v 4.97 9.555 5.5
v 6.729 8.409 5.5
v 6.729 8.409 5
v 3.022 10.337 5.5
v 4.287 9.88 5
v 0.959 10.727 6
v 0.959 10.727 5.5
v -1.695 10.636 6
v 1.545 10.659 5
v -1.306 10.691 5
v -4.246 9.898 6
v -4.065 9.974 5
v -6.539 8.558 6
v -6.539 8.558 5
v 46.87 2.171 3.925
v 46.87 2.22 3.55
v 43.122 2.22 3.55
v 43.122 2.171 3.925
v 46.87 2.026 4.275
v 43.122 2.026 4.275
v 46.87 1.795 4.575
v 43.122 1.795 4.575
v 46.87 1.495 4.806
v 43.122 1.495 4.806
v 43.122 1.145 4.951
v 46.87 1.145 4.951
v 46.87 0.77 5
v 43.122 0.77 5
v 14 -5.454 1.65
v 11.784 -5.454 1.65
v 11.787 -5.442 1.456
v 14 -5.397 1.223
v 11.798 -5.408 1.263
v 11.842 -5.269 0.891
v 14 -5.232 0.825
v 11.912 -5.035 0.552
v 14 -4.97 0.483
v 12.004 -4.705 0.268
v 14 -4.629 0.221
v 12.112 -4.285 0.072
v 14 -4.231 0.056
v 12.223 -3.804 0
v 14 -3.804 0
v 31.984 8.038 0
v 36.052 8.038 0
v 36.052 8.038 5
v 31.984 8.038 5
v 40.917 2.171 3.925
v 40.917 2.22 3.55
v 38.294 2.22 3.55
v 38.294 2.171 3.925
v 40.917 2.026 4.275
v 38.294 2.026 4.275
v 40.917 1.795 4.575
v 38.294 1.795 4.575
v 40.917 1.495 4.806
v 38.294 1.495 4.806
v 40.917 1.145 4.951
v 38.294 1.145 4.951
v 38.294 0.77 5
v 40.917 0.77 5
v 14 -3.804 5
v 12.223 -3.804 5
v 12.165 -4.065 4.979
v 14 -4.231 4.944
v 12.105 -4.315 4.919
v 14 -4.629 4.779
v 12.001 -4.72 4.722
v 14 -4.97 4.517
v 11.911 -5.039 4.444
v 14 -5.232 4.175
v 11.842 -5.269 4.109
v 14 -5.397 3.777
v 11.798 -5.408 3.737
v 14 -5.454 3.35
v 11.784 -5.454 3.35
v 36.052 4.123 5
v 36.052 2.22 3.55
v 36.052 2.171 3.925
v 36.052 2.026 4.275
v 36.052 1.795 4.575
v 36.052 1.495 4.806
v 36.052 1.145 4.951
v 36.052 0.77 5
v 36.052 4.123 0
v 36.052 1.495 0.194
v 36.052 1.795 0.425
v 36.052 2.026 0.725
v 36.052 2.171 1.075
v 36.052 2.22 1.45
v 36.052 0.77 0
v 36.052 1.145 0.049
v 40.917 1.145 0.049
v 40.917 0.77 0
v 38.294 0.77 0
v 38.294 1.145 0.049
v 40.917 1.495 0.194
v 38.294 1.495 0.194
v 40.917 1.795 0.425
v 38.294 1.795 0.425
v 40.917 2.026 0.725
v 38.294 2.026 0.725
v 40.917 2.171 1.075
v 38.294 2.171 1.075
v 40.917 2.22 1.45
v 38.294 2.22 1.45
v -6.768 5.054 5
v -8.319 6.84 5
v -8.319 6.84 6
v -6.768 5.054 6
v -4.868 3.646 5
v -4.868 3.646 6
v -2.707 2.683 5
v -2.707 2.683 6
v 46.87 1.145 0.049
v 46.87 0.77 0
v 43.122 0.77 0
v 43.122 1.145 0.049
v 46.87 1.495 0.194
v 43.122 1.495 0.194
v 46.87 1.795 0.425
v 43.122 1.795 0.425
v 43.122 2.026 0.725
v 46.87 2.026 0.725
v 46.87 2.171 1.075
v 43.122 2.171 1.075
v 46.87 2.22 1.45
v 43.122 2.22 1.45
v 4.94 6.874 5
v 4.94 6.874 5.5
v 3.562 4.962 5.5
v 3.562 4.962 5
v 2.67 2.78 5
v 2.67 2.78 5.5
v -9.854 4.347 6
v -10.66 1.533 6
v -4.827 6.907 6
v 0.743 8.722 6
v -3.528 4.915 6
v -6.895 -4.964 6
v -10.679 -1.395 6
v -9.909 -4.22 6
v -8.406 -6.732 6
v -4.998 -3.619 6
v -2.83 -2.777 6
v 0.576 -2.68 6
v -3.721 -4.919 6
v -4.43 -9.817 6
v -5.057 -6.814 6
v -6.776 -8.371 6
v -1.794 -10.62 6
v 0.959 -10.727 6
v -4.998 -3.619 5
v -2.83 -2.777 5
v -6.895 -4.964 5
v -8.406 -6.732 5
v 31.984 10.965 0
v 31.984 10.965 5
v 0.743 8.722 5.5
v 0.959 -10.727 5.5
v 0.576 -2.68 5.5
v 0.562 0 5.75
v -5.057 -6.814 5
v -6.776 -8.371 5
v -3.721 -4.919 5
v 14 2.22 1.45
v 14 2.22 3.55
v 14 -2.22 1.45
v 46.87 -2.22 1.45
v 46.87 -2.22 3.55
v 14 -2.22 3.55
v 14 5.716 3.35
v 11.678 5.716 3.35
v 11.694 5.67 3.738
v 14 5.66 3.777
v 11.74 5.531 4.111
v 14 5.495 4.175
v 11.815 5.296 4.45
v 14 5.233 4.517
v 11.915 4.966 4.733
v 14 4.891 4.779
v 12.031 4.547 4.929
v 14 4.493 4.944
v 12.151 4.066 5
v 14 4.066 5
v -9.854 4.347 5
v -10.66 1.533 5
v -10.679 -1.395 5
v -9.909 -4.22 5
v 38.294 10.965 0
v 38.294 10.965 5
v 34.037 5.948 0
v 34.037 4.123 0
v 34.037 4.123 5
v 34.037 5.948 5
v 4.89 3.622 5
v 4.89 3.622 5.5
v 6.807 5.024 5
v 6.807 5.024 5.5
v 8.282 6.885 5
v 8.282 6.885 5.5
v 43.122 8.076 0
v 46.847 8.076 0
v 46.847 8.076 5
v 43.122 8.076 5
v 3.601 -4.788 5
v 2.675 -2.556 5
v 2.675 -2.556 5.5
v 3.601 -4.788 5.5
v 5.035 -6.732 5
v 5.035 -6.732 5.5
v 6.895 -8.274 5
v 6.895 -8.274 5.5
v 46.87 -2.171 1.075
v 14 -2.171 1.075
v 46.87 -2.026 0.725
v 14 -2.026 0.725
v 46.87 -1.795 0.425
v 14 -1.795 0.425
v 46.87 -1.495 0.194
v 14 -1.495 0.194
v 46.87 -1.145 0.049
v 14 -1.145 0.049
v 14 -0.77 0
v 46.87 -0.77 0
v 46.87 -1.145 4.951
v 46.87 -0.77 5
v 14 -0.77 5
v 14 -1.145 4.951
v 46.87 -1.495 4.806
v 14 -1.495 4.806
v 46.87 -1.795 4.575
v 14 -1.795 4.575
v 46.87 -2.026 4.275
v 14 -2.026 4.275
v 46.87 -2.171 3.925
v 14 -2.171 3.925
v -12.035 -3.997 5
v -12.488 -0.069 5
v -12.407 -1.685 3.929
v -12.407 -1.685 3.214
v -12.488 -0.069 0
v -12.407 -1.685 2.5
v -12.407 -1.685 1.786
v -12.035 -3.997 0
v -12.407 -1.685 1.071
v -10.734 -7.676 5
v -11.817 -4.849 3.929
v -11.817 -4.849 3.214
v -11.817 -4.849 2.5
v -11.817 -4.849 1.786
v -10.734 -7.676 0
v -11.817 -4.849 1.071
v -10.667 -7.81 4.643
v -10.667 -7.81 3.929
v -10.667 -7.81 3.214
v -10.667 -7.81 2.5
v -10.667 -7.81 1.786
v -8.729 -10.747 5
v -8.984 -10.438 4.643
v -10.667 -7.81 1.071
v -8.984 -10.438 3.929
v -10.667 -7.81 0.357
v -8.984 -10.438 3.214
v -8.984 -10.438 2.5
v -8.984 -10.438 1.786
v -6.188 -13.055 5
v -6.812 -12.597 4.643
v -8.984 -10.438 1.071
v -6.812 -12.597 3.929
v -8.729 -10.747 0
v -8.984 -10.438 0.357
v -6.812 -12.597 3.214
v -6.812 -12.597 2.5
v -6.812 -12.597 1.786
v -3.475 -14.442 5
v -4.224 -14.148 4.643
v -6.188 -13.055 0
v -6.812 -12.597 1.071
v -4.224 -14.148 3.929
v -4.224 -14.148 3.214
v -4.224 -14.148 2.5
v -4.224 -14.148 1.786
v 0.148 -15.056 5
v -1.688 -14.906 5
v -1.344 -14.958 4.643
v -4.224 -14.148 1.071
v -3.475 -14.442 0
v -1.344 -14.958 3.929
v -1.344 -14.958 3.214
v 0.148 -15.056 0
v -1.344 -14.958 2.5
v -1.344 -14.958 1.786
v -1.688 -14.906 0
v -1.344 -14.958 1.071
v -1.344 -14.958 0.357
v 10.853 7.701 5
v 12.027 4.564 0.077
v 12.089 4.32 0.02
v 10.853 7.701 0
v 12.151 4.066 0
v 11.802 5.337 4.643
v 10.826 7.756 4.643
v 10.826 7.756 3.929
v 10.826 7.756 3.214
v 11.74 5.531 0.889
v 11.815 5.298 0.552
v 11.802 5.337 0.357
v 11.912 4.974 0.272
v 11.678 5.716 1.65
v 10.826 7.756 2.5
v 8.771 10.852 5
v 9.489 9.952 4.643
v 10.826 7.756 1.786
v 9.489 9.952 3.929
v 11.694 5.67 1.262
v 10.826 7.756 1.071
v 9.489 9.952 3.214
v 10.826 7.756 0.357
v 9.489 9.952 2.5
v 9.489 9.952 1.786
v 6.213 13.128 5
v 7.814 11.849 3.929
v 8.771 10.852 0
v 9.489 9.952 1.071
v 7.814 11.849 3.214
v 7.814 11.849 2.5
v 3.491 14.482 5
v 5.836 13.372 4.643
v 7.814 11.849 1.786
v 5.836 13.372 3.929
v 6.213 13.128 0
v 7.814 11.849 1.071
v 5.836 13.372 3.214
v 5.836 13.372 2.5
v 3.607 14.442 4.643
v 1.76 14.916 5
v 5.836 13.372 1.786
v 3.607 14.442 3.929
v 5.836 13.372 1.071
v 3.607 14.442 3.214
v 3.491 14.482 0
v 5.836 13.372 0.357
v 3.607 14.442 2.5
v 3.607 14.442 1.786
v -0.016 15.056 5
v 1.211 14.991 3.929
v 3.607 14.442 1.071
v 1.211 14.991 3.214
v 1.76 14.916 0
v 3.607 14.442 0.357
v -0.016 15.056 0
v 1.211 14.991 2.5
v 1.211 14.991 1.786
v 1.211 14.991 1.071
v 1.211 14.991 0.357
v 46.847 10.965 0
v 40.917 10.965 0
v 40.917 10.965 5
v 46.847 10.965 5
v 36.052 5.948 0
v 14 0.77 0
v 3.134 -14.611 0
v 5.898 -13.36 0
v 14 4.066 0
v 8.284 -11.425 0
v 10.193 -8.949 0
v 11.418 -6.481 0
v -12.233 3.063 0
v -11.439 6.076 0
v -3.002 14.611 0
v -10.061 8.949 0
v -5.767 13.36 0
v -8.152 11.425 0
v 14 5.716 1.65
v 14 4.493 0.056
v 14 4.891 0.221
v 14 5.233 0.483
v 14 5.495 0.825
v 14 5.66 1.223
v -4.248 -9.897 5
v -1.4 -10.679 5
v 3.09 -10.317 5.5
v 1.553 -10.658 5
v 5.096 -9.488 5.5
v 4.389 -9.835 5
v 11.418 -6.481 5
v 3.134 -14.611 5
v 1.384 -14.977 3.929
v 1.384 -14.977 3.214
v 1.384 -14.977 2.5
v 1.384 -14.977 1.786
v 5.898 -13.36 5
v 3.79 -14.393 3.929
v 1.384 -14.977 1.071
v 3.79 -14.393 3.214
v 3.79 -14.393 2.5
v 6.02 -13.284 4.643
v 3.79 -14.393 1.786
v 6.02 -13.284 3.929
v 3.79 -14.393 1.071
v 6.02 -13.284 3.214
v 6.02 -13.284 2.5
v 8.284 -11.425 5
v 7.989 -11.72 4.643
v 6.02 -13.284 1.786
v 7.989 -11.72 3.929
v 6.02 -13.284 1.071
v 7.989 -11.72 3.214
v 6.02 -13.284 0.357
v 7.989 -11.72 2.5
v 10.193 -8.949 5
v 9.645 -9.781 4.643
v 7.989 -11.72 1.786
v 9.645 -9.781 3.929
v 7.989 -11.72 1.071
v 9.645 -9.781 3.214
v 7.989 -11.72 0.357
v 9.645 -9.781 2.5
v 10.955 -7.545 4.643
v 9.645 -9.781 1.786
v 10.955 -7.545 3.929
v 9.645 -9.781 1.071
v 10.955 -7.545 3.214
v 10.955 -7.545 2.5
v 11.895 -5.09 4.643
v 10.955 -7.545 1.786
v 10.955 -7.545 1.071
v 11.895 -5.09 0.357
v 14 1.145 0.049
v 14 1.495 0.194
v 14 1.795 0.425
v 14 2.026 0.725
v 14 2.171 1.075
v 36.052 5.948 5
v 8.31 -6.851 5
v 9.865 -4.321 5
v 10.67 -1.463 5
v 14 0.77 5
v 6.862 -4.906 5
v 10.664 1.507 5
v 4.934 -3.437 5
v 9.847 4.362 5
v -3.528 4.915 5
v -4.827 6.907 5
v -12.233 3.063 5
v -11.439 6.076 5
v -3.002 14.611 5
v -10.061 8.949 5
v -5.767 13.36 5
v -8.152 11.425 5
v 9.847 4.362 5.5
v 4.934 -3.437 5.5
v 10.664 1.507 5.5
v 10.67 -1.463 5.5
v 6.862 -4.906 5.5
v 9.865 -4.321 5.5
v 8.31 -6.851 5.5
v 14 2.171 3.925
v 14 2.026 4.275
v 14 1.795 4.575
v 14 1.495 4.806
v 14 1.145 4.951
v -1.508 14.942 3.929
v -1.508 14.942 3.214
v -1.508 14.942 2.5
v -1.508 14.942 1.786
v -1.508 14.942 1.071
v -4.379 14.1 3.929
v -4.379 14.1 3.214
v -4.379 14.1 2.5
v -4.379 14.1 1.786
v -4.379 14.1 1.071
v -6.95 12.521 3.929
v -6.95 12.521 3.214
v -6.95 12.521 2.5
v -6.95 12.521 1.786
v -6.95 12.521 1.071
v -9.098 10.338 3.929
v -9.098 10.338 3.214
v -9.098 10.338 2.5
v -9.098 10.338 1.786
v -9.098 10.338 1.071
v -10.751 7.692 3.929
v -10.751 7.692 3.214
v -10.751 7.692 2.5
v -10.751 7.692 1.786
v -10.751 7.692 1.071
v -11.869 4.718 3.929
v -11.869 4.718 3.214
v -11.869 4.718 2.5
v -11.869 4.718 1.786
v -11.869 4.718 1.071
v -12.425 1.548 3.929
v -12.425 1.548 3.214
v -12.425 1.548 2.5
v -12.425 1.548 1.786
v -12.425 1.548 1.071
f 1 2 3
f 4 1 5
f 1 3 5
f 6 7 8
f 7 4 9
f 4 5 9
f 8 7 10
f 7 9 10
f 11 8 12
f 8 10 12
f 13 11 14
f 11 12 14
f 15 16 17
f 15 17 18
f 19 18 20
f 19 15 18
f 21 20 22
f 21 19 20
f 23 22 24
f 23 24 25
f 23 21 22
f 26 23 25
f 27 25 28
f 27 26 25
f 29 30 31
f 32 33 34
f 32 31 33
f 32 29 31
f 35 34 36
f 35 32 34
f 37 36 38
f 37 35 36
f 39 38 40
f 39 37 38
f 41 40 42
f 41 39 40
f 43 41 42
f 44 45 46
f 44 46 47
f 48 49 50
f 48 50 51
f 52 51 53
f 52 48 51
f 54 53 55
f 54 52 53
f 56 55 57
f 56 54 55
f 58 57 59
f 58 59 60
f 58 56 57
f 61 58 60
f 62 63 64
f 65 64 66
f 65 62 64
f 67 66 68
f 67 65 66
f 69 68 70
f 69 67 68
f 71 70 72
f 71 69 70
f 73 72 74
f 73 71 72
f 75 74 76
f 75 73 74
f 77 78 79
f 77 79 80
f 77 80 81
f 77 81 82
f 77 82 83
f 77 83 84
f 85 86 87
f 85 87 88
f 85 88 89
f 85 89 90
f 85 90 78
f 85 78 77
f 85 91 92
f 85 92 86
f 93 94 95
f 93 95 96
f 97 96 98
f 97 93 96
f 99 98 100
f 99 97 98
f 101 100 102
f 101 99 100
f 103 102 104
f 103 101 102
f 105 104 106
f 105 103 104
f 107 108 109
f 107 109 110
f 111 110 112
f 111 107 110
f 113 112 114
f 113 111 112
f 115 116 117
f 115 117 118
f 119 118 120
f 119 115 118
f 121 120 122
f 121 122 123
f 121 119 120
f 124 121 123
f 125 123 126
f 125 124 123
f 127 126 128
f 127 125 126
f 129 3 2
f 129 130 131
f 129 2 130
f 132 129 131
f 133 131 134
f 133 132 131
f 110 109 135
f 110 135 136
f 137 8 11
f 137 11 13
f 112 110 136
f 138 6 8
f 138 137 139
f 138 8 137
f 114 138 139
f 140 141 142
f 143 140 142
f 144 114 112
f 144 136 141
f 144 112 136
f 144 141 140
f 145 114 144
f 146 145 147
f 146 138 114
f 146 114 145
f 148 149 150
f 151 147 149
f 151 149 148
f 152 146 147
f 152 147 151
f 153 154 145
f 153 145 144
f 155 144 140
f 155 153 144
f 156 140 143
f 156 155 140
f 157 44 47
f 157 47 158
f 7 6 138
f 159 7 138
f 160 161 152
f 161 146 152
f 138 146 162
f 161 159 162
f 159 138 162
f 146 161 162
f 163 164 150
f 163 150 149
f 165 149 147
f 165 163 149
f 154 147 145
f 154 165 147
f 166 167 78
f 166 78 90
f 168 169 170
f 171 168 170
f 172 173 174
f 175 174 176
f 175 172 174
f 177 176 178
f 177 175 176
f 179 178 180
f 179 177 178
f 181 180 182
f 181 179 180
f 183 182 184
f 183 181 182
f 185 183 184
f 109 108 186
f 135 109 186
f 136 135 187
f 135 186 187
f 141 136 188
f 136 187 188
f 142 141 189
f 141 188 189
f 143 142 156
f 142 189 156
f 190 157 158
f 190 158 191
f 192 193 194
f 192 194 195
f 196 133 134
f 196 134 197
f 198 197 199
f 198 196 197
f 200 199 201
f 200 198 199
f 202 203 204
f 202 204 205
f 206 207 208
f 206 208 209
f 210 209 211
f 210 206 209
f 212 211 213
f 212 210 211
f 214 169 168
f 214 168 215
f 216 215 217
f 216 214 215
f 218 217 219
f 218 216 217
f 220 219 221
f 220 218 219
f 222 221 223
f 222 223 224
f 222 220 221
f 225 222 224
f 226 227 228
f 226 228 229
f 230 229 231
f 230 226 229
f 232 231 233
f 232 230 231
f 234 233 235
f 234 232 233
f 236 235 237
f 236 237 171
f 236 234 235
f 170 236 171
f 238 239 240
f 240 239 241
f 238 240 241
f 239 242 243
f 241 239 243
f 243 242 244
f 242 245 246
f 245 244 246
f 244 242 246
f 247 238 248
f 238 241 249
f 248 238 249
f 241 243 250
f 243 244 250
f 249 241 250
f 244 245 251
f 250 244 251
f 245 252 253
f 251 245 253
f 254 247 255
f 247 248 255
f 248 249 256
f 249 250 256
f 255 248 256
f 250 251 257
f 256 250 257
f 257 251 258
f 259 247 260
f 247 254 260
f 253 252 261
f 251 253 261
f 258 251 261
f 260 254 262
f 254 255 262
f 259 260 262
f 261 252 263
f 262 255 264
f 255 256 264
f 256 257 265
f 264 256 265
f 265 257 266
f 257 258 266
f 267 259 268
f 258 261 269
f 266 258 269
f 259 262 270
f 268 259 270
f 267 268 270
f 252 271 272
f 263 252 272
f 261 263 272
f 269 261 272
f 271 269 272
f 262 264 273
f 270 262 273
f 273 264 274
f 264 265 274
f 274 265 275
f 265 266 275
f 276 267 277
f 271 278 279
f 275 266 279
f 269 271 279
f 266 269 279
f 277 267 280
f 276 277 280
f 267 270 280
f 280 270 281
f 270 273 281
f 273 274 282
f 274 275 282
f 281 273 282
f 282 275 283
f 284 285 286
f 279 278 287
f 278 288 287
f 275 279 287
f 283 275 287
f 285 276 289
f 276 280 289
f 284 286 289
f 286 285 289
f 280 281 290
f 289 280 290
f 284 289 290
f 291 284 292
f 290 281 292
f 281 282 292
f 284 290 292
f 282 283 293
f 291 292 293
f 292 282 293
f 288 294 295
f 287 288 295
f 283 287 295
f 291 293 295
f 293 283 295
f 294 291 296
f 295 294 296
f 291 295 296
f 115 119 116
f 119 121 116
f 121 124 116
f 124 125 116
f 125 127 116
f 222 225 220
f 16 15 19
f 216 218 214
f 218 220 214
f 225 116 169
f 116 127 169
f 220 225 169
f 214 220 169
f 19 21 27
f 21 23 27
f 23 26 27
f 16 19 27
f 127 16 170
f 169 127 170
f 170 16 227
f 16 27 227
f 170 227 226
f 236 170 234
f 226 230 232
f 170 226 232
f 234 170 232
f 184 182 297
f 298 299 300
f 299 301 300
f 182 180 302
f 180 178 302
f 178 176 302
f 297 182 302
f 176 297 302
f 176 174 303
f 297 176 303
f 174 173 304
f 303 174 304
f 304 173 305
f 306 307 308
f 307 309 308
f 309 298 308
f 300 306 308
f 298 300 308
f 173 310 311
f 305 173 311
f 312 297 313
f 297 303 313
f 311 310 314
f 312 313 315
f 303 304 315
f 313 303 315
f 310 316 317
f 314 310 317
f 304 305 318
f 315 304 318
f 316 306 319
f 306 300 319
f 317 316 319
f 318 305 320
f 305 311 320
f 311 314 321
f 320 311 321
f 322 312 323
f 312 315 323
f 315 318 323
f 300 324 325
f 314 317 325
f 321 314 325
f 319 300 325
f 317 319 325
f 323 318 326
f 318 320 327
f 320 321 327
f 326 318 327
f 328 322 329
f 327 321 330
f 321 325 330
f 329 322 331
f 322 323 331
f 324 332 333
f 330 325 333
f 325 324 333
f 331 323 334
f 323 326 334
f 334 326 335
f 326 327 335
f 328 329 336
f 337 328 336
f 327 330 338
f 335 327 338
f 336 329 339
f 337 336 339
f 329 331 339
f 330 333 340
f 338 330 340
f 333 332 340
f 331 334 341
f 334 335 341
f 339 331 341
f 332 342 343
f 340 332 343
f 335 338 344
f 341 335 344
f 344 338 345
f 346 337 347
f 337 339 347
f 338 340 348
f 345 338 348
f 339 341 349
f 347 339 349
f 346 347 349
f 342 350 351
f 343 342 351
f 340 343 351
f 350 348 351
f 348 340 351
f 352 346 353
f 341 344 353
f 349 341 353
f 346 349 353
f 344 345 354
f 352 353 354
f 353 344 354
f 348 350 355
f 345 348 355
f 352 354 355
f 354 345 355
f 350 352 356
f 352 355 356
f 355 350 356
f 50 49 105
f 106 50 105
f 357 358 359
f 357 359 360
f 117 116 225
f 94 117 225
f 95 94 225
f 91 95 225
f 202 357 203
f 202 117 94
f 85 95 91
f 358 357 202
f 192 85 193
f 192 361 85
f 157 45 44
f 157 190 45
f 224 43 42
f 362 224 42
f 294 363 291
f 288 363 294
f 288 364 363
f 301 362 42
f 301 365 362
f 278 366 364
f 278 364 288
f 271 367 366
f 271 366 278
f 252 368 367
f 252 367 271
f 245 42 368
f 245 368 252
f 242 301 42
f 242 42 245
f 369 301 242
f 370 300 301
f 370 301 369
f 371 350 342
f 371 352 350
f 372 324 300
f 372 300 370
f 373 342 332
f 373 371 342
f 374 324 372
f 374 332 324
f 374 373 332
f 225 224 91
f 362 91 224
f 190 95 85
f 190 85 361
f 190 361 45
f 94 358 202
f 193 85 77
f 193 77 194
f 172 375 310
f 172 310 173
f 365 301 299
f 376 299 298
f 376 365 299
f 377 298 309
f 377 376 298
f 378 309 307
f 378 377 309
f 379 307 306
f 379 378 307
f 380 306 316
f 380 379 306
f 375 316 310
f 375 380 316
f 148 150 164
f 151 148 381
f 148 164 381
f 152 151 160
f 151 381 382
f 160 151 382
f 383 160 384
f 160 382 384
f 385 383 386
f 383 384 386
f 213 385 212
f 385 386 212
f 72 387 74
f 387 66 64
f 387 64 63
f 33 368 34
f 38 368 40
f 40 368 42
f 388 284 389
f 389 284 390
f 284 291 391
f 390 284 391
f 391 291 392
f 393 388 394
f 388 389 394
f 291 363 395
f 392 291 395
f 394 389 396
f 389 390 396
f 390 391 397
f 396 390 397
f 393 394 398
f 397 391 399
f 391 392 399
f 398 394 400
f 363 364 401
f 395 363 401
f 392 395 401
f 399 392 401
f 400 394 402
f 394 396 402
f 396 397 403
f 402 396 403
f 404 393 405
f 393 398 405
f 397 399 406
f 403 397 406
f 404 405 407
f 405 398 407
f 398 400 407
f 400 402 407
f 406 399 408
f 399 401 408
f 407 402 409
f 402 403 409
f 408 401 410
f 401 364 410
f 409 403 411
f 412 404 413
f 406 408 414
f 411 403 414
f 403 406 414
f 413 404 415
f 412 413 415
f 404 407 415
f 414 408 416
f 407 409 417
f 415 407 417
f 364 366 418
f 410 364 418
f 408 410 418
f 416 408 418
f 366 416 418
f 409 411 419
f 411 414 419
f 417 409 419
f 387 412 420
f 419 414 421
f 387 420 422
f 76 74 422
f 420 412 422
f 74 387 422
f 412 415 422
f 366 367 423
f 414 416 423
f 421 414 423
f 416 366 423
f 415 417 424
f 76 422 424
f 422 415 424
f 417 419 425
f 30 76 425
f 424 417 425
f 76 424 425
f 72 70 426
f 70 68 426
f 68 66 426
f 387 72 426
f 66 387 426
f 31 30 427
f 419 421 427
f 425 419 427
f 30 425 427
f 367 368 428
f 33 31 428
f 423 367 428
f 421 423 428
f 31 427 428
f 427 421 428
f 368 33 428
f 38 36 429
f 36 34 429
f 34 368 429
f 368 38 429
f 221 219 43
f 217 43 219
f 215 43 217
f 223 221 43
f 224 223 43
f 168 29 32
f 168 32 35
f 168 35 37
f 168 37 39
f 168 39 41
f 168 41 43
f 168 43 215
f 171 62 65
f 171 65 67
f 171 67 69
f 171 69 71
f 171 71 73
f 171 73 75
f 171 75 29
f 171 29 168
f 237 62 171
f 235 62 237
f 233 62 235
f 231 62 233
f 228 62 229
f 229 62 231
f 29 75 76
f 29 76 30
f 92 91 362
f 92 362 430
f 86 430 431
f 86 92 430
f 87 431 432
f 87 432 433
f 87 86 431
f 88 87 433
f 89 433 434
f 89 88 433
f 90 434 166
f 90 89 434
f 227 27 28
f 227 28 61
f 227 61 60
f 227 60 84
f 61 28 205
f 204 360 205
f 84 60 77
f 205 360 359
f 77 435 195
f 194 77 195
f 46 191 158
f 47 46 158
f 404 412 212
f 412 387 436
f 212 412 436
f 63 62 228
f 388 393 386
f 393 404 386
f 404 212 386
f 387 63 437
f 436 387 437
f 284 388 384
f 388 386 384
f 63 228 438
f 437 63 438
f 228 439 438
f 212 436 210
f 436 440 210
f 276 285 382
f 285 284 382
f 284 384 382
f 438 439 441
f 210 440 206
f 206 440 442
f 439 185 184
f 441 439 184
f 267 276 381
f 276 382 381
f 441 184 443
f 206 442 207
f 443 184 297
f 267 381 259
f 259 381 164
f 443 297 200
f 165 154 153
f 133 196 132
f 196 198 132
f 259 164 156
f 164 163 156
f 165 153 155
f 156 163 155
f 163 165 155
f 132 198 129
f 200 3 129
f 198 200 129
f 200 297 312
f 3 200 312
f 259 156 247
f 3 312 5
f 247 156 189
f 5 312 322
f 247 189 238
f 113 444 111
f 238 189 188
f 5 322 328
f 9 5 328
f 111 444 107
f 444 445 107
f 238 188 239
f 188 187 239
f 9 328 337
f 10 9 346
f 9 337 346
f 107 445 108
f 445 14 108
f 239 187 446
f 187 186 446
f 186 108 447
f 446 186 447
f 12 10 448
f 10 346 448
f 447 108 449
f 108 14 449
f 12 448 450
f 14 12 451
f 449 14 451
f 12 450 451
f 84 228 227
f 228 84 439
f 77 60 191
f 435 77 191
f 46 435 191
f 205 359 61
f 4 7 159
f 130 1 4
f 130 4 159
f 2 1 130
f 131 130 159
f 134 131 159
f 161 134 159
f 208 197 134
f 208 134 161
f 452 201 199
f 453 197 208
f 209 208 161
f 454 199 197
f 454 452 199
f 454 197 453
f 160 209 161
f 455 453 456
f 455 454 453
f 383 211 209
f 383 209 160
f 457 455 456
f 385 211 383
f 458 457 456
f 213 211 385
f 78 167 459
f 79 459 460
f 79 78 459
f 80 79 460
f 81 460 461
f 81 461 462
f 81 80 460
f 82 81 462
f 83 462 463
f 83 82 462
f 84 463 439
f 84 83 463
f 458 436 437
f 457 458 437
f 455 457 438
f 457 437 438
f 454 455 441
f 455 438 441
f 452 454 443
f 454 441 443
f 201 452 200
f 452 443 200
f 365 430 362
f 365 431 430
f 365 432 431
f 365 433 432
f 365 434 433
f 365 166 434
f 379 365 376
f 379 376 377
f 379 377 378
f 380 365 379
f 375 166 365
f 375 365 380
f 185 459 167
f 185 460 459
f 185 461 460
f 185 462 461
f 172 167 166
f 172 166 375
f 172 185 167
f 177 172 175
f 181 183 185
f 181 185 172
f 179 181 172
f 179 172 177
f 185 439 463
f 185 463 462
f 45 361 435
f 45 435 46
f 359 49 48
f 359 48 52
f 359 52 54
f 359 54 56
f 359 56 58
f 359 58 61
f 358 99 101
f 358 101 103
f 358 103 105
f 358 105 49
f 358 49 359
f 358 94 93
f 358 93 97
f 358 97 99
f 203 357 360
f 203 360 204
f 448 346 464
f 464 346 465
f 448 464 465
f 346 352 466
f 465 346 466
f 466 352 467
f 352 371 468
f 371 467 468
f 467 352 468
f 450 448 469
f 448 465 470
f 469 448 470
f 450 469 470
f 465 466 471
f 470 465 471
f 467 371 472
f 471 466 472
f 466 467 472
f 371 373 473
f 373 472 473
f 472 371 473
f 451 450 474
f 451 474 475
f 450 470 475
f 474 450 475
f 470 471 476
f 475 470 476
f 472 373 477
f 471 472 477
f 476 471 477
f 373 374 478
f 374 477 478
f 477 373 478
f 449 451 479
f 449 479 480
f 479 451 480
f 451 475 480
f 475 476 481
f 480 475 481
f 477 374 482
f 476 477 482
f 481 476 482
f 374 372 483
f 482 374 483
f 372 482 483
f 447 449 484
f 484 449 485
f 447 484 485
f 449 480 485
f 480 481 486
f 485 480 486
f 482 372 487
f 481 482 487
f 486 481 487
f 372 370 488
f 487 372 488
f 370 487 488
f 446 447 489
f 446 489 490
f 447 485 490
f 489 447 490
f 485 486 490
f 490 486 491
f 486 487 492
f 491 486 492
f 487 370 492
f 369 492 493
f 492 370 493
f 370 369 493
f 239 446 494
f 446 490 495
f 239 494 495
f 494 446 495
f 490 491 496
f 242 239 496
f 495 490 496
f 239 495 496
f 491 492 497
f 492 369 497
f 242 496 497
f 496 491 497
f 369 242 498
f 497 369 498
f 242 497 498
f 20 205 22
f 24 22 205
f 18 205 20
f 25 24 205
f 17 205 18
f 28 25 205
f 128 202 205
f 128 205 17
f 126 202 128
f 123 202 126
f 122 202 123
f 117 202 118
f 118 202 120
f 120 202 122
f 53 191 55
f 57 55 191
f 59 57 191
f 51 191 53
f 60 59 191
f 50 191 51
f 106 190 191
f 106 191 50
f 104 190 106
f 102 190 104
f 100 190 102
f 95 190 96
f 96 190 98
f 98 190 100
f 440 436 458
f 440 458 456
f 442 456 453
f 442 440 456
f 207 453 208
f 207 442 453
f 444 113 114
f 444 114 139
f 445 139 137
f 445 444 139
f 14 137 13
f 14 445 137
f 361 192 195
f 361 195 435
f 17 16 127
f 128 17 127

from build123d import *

# Parameters (mm, degrees)
PAD002_DEPTH = 35
PAD003_DEPTH = 4
PAD004_DEPTH = 5
PAD005_DEPTH = 5
PAD_DEPTH    = 1
POCKET_DEPTH = 0.5


with BuildPart() as part:
    # Sketch002 → Pad002 (new body)
    with BuildSketch(Plane.YZ.offset(46.87)):
        with BuildLine():
            Line((-0.77, 5), (0.77, 5))
            ThreePointArc((2.22, 3.55), (1.795305, 4.575305), (0.77, 5))
            Line((2.22, 3.55), (2.22, 1.45))
            ThreePointArc((0.77, 0), (1.795305, 0.424695), (2.22, 1.45))
            Line((0.77, 0), (-0.77, 0))
            ThreePointArc((-2.22, 1.45), (-1.795305, 0.424695), (-0.77, 0))
            Line((-2.22, 1.45), (-2.22, 3.55))
            ThreePointArc((-0.77, 5), (-1.795305, 4.575305), (-2.22, 3.55))
        make_face()
    extrude(amount=-PAD002_DEPTH)

    # Sketch003 → Pad003 (join)
    with BuildSketch(Plane.YZ.offset(14)):
        with BuildLine():
            Line((-3.803555, 0), (4.066445, 0))
            ThreePointArc((4.066445, 0), (5.233171, 0.483274), (5.716445, 1.65))
            Line((5.716445, 1.65), (5.716445, 3.35))
            ThreePointArc((5.716445, 3.35), (5.233171, 4.516726), (4.066445, 5))
            Line((4.066445, 5), (-3.803555, 5))
            ThreePointArc((-3.803555, 5), (-4.970281, 4.516726), (-5.453555, 3.35))
            Line((-5.453555, 3.35), (-5.453555, 1.65))
            ThreePointArc((-5.453555, 1.65), (-4.970281, 0.483274), (-3.803555, 0))
        make_face()
    extrude(amount=-PAD003_DEPTH)

    # Sketch005 → Pad004 (join)
    with BuildSketch(Plane.XY):
        with BuildLine():
            add(Edge.make_bspline(
                [(-0.016421, 15.055976), (-1.51312, 15.047784), (-3.00857, 14.811385), (-4.467156, 14.346958), (-5.853346, 13.665527), (-7.137203, 12.788252), (-8.299907, 11.744186), (-9.335169, 10.555337), (-10.232104, 9.242889), (-10.987087, 7.827952), (-11.593837, 6.330415), (-12.049258, 4.771197), (-12.350633, 3.170976), (-12.496836, 1.550706), (-12.487972, -0.068717)],
                knots=[0, 0, 0, 0, 0, 0, 0, 0, 0, 0, 0, 0, 0, 0, 0, 1.570796, 1.570796, 1.570796, 1.570796, 1.570796, 1.570796, 1.570796, 1.570796, 1.570796, 1.570796, 1.570796, 1.570796, 1.570796, 1.570796, 1.570796], degree=14))
            add(Edge.make_bspline(
                [(-12.487972, -0.068717), (-12.479108, -1.688139), (-12.315176, -3.306712), (-11.996302, -4.903537), (-11.523839, -6.457677), (-10.900731, -7.948482), (-10.130305, -9.35507), (-9.219056, -10.65762), (-8.170841, -11.835064), (-6.996777, -12.86634), (-5.703394, -13.729507), (-4.309827, -14.395723), (-2.846245, -14.844155), (-1.348296, -15.064169), (0.148403, -15.055976)],
                knots=[1.570796, 1.570796, 1.570796, 1.570796, 1.570796, 1.570796, 1.570796, 1.570796, 1.570796, 1.570796, 1.570796, 1.570796, 1.570796, 1.570796, 1.570796, 3.141593, 3.141593, 3.141593, 3.141593, 3.141593, 3.141593, 3.141593, 3.141593, 3.141593, 3.141593, 3.141593, 3.141593, 3.141593, 3.141593, 3.141593], degree=14))
            add(Edge.make_bspline(
                [(0.148403, -15.055976), (1.645102, -15.047784), (3.140552, -14.811385), (4.599138, -14.346958), (5.985328, -13.665527), (7.269185, -12.788252), (8.431889, -11.744186), (9.467151, -10.555337), (10.364086, -9.242889), (11.119069, -7.827952), (11.725819, -6.330415), (12.18124, -4.771197), (12.482615, -3.170976), (12.628818, -1.550706), (12.619954, 0.068717)],
                knots=[3.141593, 3.141593, 3.141593, 3.141593, 3.141593, 3.141593, 3.141593, 3.141593, 3.141593, 3.141593, 3.141593, 3.141593, 3.141593, 3.141593, 3.141593, 4.712389, 4.712389, 4.712389, 4.712389, 4.712389, 4.712389, 4.712389, 4.712389, 4.712389, 4.712389, 4.712389, 4.712389, 4.712389, 4.712389, 4.712389], degree=14))
            add(Edge.make_bspline(
                [(12.619954, 0.068717), (12.61109, 1.688139), (12.447158, 3.306712), (12.128284, 4.903537), (11.655821, 6.457677), (11.032713, 7.948482), (10.262287, 9.35507), (9.351038, 10.65762), (8.302823, 11.835064), (7.128759, 12.86634), (5.835376, 13.729507), (4.441809, 14.395723), (2.978227, 14.844155), (1.480278, 15.064169), (-0.016421, 15.055976)],
                knots=[4.712389, 4.712389, 4.712389, 4.712389, 4.712389, 4.712389, 4.712389, 4.712389, 4.712389, 4.712389, 4.712389, 4.712389, 4.712389, 4.712389, 4.712389, 6.283185, 6.283185, 6.283185, 6.283185, 6.283185, 6.283185, 6.283185, 6.283185, 6.283185, 6.283185, 6.283185, 6.283185, 6.283185, 6.283185, 6.283185], degree=14))
        make_face()
    extrude(amount=PAD004_DEPTH)

    # Sketch006 → Pad005 (join)
    with BuildSketch(Plane.XY):
        Polygon((43.121773, 8.076345), (43.121773, 0.549987), (40.917084, 0.549987), (40.917084, 10.96525), (46.846939, 10.96525), (46.846939, 8.076345), align=None)
        Polygon((31.984285, 10.96525), (38.294262, 10.96525), (38.294262, 0.626011), (36.051559, 0.626011), (36.051559, 4.123106), (34.036926, 4.123106), (34.036926, 5.947678), (36.051559, 5.947678), (36.051559, 8.038333), (31.984285, 8.038333), align=None)
    extrude(amount=PAD005_DEPTH)

    # Sketch (on Face46 of Pad005) → Pad (join)
    with BuildSketch(Plane(origin=(0, 0, 5), x_dir=(0, -1, 0), z_dir=(0, 0, 1))):
        with BuildLine():
            ThreePointArc((-8.409153, 6.728971), (-10.769324, 0.120636), (-8.557777, -6.53891))
            ThreePointArc((-2.682549, -2.707352), (-5.947717, -4.120868), (-8.557777, -6.53891))
            ThreePointArc((-6.84041, -8.318755), (-4.297701, -5.856698), (-2.682549, -2.707352))
            ThreePointArc((-6.84041, -8.318755), (-0.069564, -10.769775), (6.732378, -8.406425))
            ThreePointArc((2.777161, -2.829888), (4.233029, -5.988206), (6.732378, -8.406425))
            ThreePointArc((8.371362, -6.775928), (5.903039, -4.336809), (2.777161, -2.829888))
            ThreePointArc((8.371362, -6.775928), (10.769725, 0.076933), (8.273705, 6.894832))
            ThreePointArc((2.555971, 2.675341), (5.803156, 4.258886), (8.273705, 6.894832))
            ThreePointArc((6.851023, 8.310017), (4.104112, 5.949562), (2.555971, 2.675341))
            ThreePointArc((6.851023, 8.310017), (-0.022073, 10.769977), (-6.885028, 8.281865))
            ThreePointArc((-2.780082, 2.669729), (-4.25796, 5.896079), (-6.885028, 8.281865))
            ThreePointArc((-8.409153, 6.728971), (-5.958868, 4.194233), (-2.780082, 2.669729))
        make_face()
    extrude(amount=PAD_DEPTH)

    # Sketch009 (on Face74 of Pad) → Pocket (cut)
    with BuildSketch(Plane(origin=(1, 0, 6), x_dir=(0, -1, 0), z_dir=(0, 0, 1))):
        with BuildLine():
            add(Edge.make_bspline(
                [(-10.77411, 0), (-10.77411, -0.438108), (0, -0.438108), (10.77411, -0.438108), (10.77411, 0)],
                knots=[0, 0, 0, 1.570796, 1.570796, 3.141593, 3.141593, 3.141593], degree=2, weights=[1, 0.707107, 1, 0.707107, 1]))
            Line((10.77411, 0), (10.77411, 9.970053))
            Line((10.77411, 9.970053), (-10.77411, 9.970053))
            Line((-10.77411, 9.970053), (-10.77411, 0))
        make_face()
    extrude(amount=-POCKET_DEPTH, mode=Mode.SUBTRACT)


solid = part.part
